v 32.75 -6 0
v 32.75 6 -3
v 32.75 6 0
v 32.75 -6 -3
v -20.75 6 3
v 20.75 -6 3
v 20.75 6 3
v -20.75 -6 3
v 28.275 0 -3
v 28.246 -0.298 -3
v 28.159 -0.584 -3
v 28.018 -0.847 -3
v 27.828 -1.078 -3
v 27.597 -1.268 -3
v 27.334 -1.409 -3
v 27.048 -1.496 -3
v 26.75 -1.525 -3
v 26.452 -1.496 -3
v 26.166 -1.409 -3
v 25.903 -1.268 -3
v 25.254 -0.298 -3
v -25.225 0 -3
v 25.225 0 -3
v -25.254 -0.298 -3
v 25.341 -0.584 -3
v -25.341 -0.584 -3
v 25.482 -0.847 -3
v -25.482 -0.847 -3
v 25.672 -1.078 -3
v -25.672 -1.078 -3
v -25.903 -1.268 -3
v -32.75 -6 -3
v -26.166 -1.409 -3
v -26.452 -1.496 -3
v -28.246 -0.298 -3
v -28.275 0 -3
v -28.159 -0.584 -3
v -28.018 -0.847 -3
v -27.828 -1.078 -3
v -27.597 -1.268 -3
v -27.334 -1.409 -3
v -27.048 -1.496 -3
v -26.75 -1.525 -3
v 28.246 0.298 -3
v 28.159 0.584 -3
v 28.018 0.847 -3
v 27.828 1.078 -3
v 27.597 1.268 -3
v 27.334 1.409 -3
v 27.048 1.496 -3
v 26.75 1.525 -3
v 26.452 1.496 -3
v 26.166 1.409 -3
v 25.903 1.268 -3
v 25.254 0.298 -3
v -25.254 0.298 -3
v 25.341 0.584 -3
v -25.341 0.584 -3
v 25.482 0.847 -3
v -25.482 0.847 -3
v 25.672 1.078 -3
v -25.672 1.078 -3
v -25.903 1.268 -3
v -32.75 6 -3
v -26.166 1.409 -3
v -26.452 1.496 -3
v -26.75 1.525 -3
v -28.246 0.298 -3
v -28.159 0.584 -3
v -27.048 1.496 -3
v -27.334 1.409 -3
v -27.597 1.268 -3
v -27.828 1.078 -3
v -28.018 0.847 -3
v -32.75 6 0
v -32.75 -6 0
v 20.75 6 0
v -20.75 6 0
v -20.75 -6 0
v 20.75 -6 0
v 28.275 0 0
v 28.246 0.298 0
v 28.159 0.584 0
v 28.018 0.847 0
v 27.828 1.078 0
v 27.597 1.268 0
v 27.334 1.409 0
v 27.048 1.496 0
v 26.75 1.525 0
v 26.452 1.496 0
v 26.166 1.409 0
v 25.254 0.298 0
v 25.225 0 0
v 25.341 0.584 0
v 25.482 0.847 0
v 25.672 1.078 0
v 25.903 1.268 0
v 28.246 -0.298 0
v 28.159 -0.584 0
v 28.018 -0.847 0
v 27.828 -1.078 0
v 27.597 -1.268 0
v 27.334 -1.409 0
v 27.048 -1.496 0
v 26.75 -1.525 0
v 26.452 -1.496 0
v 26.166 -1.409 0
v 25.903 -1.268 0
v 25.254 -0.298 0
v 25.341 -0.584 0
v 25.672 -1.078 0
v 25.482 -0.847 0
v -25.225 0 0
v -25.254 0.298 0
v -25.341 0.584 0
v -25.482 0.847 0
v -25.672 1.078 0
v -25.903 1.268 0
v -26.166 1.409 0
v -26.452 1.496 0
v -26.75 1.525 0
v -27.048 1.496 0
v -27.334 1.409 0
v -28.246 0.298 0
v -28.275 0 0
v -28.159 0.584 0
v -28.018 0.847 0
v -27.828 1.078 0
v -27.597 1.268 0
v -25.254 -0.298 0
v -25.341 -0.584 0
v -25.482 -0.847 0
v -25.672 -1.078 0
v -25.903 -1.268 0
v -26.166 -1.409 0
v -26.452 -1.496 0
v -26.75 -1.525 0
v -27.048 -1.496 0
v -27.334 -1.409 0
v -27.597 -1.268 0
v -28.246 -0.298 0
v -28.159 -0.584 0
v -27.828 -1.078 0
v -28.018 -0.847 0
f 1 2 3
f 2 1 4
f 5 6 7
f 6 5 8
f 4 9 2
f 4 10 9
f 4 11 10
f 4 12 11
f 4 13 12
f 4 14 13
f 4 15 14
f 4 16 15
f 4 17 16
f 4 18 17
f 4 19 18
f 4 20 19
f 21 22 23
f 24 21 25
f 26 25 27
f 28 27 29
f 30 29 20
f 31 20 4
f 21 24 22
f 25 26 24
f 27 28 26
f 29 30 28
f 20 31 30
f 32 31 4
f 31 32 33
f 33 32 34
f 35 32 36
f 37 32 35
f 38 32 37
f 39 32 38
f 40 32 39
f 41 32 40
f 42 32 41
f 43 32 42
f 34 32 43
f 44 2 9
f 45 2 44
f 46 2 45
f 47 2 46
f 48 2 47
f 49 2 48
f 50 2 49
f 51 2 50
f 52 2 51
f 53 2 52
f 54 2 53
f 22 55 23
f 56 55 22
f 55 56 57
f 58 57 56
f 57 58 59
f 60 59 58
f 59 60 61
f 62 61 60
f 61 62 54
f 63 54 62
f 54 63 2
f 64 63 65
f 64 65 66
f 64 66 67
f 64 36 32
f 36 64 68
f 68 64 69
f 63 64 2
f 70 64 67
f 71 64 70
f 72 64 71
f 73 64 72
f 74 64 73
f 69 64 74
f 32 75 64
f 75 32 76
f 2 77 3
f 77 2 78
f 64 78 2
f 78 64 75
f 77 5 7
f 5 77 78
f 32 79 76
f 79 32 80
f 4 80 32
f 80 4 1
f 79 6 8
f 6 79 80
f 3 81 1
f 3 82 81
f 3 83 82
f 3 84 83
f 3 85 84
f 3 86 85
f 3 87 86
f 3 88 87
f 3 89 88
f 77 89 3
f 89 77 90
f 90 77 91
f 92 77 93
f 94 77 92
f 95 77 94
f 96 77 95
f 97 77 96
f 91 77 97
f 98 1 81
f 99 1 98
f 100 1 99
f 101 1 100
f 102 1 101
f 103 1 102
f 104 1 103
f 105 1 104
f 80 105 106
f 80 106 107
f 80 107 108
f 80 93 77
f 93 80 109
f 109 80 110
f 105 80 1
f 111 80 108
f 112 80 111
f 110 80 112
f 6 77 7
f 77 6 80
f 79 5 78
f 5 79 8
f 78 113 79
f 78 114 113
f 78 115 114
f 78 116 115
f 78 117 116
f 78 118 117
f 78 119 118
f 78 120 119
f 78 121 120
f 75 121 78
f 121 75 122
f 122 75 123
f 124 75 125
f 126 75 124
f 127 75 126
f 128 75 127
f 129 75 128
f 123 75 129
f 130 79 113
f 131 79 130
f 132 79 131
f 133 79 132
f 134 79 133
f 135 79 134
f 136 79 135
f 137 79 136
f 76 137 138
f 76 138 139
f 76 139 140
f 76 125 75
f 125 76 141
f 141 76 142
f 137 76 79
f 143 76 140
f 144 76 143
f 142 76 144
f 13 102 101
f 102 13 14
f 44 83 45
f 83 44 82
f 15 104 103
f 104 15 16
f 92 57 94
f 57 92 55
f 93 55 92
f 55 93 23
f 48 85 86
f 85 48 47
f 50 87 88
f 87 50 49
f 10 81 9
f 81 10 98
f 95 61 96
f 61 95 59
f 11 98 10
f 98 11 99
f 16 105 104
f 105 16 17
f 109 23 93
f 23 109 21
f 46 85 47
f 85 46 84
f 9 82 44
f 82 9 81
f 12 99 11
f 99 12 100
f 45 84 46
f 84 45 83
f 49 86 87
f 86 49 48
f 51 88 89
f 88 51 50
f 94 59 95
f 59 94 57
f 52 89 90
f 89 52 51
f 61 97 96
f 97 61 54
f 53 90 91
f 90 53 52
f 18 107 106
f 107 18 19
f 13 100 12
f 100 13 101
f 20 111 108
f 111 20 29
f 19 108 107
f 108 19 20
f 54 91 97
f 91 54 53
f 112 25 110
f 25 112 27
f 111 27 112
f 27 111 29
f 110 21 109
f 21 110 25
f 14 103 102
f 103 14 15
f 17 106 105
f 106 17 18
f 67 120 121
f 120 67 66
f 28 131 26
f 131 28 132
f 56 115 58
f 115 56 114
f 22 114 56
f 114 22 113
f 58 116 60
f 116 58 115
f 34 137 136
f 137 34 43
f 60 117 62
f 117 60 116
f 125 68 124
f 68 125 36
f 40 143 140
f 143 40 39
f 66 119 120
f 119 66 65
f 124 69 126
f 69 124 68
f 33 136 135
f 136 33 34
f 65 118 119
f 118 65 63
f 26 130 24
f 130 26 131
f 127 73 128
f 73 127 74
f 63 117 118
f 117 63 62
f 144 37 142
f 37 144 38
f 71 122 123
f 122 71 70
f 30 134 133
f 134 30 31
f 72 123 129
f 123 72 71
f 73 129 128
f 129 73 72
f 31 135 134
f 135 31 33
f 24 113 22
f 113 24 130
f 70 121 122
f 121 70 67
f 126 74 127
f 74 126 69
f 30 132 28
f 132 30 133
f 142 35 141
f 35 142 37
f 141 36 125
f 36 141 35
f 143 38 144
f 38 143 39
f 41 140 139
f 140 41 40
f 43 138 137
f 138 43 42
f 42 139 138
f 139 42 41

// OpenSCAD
// file: configuration.scad
// Increase this if your slicer or printer make holes too tight.
extra_radius = 0.1;
extra_extrusion_width = 0.5;

// OD = outside diameter, corner to corner.
m3_nut_od = 6.1;
m3_nut_radius = m3_nut_od/2 + 0.35 + extra_radius;
m3_washer_radius = 3.5 + extra_radius;

// Major diameter of metric 3mm thread.
m3_major = 2.85;
m3_radius = m3_major/2 + extra_radius;
m3_wide_radius = m3_major/2 + extra_radius;

// NEMA17 stepper motors.
motor_shaft_diameter = 5;
motor_shaft_radius = motor_shaft_diameter/2 + extra_radius;

// Frame brackets. M3x8mm screws work best with 3.6 mm brackets.
thickness = 3.6;

// OpenBeam or Misumi. Currently only 15x15 mm, but there is a plan
// to make models more parametric and allow 20x20 mm in the future.
extrusion = 15;

// Placement for the NEMA17 stepper motors.
motor_offset = 44;
motor_length = 47;
// main file
include <configuration.scad>;

bearing_distance = 70;
bearing_major_dia = 13;
bearing_minor_dia = 4;
bearing_thickness = 6;
thickness = 3;
spacing = 53.5;

module roller(){
	difference(){
		union(){
			cube([bearing_thickness * 2, bearing_distance+bearing_major_dia, thickness], center=true);
			translate([-bearing_thickness, (bearing_distance-bearing_major_dia)/2, 0]) 
				bearing_holder();
			translate([-bearing_thickness, (-bearing_major_dia-bearing_distance)/2, 0]) 
				bearing_holder();

/*
			#translate([0, bearing_distance/2, 2+(thickness+bearing_major_dia)/2])
			rotate([0,90,0]) 
				cylinder(r=bearing_major_dia/2, h=bearing_thickness, center=true);
			#translate([0, -bearing_distance/2, 2+(thickness+bearing_major_dia)/2])
			rotate([0,90,0]) 
				cylinder(r=bearing_major_dia/2, h=bearing_thickness, center=true);*/
		}
	translate([0,0,-2]) cylinder(r=m3_nut_radius, h=2.5, $fn=6);
	cylinder(r=m3_wide_radius, h=thickness*3, $fn=48, center=true);
	}
}

module bearing_holder(){
	difference(){
		cube([bearing_thickness * 2, bearing_major_dia, bearing_major_dia+1]); 
		translate([(bearing_thickness-2)/2, -1, 1]) 
			cube([bearing_thickness+2, bearing_major_dia+6, bearing_major_dia+3]); 
		translate([bearing_thickness, 0, bearing_major_dia+3])
			rotate([45, 0, 0])
				cube([2+bearing_thickness*2, 8, 8], center=true);
		translate([bearing_thickness, bearing_major_dia, bearing_major_dia+3])
			rotate([45, 0, 0])
				cube([2+bearing_thickness*2, 8, 8], center=true);
		translate([bearing_thickness, bearing_major_dia/2, 2+(thickness+bearing_major_dia)/2]) 
			rotate([0, 90, 0]) cylinder(r=bearing_minor_dia/2, h=2+bearing_thickness*2, center=true, $fn=48);
	}
}

module spacer(){
	difference(){
		cube([spacing+(bearing_thickness*2), bearing_thickness*2, thickness*2], center=true);
		translate([spacing/2+0.5, 0, thickness])
			cube([1+bearing_thickness*2, 1+bearing_thickness*2, thickness*2], center=true);
		translate([-spacing/2-0.5, 0, thickness])
			cube([1+bearing_thickness*2, 1+bearing_thickness*2, thickness*2], center=true);
	   translate([spacing/2, 0, 0]) cylinder(r=m3_wide_radius, h=thickness*3, center=true, $fn=32);
		translate([-spacing/2, 0, 0]) cylinder(r=m3_wide_radius, h=thickness*3, center=true, $fn=32);
	}
}

module axle(){
	cylinder(r=bearing_minor_dia/2, h=bearing_thickness*2, $fn=48);
}

spacer();
